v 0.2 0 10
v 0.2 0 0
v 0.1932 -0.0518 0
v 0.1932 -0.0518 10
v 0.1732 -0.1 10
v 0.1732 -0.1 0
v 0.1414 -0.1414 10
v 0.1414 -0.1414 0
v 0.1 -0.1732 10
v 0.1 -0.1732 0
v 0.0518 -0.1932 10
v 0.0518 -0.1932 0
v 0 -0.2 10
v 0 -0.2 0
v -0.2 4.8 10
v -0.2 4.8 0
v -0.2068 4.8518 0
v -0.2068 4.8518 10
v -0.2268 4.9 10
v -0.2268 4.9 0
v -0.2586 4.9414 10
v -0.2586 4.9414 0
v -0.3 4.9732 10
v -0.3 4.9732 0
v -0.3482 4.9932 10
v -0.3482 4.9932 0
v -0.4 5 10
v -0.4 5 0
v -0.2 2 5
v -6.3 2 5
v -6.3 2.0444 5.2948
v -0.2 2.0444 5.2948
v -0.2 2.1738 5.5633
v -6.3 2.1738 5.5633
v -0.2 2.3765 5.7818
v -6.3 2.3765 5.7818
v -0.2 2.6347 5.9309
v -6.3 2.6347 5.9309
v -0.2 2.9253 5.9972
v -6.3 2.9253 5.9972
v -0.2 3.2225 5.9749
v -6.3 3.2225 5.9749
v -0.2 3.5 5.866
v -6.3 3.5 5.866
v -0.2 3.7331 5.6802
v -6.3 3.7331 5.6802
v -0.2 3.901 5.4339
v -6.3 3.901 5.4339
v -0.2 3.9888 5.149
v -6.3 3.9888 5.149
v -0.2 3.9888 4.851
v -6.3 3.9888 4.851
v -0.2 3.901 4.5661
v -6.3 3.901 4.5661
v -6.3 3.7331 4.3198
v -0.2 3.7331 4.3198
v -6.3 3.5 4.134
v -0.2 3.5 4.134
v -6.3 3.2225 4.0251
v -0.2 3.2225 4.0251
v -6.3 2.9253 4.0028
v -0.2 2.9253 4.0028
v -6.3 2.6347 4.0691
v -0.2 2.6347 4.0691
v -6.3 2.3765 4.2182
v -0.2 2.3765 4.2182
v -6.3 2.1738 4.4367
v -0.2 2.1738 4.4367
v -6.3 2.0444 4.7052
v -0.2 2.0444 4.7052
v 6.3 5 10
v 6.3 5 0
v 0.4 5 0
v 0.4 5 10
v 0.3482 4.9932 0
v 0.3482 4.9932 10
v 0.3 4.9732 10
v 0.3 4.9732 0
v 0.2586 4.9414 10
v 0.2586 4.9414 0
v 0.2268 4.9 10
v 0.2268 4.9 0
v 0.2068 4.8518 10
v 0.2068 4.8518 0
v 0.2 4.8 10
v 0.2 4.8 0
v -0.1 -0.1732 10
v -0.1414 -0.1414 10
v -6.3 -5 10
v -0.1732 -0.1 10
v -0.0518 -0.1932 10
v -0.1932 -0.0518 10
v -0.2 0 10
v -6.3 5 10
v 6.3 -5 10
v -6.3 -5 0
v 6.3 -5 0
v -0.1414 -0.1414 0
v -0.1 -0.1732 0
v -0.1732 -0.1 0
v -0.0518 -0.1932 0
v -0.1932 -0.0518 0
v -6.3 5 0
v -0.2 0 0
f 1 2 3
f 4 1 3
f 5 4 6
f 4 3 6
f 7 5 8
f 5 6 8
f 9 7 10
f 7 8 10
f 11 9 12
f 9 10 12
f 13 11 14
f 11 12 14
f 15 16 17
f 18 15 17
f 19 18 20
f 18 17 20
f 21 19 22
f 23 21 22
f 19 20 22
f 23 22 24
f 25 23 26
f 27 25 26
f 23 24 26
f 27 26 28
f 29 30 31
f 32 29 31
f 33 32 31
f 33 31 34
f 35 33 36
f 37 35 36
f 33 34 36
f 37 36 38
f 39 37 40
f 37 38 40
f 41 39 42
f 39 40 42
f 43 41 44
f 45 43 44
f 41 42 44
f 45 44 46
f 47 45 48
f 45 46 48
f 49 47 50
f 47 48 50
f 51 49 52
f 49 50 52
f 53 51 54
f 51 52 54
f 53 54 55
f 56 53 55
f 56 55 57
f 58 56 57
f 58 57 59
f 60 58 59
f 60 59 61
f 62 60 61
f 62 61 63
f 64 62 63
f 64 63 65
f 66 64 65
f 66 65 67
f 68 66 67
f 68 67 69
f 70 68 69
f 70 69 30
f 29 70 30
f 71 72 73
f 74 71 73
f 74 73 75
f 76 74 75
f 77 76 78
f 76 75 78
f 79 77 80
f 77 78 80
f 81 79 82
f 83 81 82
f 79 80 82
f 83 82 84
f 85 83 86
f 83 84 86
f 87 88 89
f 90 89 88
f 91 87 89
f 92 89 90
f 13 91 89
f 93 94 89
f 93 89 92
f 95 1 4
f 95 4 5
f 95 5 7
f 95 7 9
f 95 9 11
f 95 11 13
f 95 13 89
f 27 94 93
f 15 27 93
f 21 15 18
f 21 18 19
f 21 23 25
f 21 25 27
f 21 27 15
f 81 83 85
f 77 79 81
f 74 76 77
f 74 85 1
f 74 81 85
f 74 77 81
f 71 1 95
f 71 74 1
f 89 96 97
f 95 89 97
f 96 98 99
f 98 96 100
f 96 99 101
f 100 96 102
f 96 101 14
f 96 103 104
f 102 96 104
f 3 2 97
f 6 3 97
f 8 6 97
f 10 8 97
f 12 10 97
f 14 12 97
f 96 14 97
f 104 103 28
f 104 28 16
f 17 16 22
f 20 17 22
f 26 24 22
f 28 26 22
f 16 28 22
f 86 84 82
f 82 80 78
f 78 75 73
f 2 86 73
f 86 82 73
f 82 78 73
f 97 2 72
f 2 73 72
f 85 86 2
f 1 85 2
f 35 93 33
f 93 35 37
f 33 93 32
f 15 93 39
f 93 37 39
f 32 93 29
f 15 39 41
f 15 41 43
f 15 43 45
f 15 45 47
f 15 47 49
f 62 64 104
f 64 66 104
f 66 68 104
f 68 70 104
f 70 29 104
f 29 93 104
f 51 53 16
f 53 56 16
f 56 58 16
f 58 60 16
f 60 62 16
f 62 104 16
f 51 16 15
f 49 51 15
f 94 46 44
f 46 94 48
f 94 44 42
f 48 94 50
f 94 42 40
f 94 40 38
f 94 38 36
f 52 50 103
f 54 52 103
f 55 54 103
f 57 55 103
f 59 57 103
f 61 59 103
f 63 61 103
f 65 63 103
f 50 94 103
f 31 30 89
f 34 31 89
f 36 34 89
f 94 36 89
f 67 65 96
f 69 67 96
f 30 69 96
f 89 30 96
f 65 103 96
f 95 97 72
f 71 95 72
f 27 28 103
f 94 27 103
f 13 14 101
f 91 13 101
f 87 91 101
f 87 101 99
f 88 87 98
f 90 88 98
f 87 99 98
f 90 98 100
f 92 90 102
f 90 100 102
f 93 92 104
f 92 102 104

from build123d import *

# Parameters (mm, degrees)
F1_DEPTH = 10
F2_R     = 1
F3_DEPTH = 6.2


# Not quite as in the source:
# - ends of sketch curves that miss each other by under 0.0002 mm in the source are joined


with BuildPart() as f1:
    # F0 (on Top) → F1 (new body)
    with BuildSketch(Plane.XY):
        with BuildLine():
            Line((-0.3999973293, 5), (-6.2999973293, 5))
            Line((-6.2999973293, 5), (-6.2999973293, -5))
            Line((-6.2999973293, -5), (6.3, -5))
            Line((6.3, -5), (6.3, 5))
            Line((6.3, 5), (0.4, 5))
            ThreePointArc((0.4, 5), (0.2585786438, 4.9414213562), (0.2, 4.8))
            Line((0.2, 4.8), (0.2, 0))
            ThreePointArc((0.2, 0), (0.1414213562, -0.1414213562), (0, -0.2))
            ThreePointArc((0, -0.2), (-0.1414186856, -0.1414213562), (-0.1999973293, 0))
            Line((-0.1999973293, 0), (-0.1999973293, 4.8))
            ThreePointArc((-0.1999973293, 4.8), (-0.2585759731, 4.9414213562), (-0.3999973293, 5))
        make_face()
    extrude(amount=F1_DEPTH)

    # F2 (on face) → F3 (cut)
    with BuildSketch(Plane(origin=(-6.2999973293, 0, 0), x_dir=(0, -1, 0), z_dir=(-1, 0, 0))):
        with Locations((-3, 5)):
            Circle(F2_R)
    extrude(amount=-F3_DEPTH, mode=Mode.SUBTRACT)


solid = f1.part
